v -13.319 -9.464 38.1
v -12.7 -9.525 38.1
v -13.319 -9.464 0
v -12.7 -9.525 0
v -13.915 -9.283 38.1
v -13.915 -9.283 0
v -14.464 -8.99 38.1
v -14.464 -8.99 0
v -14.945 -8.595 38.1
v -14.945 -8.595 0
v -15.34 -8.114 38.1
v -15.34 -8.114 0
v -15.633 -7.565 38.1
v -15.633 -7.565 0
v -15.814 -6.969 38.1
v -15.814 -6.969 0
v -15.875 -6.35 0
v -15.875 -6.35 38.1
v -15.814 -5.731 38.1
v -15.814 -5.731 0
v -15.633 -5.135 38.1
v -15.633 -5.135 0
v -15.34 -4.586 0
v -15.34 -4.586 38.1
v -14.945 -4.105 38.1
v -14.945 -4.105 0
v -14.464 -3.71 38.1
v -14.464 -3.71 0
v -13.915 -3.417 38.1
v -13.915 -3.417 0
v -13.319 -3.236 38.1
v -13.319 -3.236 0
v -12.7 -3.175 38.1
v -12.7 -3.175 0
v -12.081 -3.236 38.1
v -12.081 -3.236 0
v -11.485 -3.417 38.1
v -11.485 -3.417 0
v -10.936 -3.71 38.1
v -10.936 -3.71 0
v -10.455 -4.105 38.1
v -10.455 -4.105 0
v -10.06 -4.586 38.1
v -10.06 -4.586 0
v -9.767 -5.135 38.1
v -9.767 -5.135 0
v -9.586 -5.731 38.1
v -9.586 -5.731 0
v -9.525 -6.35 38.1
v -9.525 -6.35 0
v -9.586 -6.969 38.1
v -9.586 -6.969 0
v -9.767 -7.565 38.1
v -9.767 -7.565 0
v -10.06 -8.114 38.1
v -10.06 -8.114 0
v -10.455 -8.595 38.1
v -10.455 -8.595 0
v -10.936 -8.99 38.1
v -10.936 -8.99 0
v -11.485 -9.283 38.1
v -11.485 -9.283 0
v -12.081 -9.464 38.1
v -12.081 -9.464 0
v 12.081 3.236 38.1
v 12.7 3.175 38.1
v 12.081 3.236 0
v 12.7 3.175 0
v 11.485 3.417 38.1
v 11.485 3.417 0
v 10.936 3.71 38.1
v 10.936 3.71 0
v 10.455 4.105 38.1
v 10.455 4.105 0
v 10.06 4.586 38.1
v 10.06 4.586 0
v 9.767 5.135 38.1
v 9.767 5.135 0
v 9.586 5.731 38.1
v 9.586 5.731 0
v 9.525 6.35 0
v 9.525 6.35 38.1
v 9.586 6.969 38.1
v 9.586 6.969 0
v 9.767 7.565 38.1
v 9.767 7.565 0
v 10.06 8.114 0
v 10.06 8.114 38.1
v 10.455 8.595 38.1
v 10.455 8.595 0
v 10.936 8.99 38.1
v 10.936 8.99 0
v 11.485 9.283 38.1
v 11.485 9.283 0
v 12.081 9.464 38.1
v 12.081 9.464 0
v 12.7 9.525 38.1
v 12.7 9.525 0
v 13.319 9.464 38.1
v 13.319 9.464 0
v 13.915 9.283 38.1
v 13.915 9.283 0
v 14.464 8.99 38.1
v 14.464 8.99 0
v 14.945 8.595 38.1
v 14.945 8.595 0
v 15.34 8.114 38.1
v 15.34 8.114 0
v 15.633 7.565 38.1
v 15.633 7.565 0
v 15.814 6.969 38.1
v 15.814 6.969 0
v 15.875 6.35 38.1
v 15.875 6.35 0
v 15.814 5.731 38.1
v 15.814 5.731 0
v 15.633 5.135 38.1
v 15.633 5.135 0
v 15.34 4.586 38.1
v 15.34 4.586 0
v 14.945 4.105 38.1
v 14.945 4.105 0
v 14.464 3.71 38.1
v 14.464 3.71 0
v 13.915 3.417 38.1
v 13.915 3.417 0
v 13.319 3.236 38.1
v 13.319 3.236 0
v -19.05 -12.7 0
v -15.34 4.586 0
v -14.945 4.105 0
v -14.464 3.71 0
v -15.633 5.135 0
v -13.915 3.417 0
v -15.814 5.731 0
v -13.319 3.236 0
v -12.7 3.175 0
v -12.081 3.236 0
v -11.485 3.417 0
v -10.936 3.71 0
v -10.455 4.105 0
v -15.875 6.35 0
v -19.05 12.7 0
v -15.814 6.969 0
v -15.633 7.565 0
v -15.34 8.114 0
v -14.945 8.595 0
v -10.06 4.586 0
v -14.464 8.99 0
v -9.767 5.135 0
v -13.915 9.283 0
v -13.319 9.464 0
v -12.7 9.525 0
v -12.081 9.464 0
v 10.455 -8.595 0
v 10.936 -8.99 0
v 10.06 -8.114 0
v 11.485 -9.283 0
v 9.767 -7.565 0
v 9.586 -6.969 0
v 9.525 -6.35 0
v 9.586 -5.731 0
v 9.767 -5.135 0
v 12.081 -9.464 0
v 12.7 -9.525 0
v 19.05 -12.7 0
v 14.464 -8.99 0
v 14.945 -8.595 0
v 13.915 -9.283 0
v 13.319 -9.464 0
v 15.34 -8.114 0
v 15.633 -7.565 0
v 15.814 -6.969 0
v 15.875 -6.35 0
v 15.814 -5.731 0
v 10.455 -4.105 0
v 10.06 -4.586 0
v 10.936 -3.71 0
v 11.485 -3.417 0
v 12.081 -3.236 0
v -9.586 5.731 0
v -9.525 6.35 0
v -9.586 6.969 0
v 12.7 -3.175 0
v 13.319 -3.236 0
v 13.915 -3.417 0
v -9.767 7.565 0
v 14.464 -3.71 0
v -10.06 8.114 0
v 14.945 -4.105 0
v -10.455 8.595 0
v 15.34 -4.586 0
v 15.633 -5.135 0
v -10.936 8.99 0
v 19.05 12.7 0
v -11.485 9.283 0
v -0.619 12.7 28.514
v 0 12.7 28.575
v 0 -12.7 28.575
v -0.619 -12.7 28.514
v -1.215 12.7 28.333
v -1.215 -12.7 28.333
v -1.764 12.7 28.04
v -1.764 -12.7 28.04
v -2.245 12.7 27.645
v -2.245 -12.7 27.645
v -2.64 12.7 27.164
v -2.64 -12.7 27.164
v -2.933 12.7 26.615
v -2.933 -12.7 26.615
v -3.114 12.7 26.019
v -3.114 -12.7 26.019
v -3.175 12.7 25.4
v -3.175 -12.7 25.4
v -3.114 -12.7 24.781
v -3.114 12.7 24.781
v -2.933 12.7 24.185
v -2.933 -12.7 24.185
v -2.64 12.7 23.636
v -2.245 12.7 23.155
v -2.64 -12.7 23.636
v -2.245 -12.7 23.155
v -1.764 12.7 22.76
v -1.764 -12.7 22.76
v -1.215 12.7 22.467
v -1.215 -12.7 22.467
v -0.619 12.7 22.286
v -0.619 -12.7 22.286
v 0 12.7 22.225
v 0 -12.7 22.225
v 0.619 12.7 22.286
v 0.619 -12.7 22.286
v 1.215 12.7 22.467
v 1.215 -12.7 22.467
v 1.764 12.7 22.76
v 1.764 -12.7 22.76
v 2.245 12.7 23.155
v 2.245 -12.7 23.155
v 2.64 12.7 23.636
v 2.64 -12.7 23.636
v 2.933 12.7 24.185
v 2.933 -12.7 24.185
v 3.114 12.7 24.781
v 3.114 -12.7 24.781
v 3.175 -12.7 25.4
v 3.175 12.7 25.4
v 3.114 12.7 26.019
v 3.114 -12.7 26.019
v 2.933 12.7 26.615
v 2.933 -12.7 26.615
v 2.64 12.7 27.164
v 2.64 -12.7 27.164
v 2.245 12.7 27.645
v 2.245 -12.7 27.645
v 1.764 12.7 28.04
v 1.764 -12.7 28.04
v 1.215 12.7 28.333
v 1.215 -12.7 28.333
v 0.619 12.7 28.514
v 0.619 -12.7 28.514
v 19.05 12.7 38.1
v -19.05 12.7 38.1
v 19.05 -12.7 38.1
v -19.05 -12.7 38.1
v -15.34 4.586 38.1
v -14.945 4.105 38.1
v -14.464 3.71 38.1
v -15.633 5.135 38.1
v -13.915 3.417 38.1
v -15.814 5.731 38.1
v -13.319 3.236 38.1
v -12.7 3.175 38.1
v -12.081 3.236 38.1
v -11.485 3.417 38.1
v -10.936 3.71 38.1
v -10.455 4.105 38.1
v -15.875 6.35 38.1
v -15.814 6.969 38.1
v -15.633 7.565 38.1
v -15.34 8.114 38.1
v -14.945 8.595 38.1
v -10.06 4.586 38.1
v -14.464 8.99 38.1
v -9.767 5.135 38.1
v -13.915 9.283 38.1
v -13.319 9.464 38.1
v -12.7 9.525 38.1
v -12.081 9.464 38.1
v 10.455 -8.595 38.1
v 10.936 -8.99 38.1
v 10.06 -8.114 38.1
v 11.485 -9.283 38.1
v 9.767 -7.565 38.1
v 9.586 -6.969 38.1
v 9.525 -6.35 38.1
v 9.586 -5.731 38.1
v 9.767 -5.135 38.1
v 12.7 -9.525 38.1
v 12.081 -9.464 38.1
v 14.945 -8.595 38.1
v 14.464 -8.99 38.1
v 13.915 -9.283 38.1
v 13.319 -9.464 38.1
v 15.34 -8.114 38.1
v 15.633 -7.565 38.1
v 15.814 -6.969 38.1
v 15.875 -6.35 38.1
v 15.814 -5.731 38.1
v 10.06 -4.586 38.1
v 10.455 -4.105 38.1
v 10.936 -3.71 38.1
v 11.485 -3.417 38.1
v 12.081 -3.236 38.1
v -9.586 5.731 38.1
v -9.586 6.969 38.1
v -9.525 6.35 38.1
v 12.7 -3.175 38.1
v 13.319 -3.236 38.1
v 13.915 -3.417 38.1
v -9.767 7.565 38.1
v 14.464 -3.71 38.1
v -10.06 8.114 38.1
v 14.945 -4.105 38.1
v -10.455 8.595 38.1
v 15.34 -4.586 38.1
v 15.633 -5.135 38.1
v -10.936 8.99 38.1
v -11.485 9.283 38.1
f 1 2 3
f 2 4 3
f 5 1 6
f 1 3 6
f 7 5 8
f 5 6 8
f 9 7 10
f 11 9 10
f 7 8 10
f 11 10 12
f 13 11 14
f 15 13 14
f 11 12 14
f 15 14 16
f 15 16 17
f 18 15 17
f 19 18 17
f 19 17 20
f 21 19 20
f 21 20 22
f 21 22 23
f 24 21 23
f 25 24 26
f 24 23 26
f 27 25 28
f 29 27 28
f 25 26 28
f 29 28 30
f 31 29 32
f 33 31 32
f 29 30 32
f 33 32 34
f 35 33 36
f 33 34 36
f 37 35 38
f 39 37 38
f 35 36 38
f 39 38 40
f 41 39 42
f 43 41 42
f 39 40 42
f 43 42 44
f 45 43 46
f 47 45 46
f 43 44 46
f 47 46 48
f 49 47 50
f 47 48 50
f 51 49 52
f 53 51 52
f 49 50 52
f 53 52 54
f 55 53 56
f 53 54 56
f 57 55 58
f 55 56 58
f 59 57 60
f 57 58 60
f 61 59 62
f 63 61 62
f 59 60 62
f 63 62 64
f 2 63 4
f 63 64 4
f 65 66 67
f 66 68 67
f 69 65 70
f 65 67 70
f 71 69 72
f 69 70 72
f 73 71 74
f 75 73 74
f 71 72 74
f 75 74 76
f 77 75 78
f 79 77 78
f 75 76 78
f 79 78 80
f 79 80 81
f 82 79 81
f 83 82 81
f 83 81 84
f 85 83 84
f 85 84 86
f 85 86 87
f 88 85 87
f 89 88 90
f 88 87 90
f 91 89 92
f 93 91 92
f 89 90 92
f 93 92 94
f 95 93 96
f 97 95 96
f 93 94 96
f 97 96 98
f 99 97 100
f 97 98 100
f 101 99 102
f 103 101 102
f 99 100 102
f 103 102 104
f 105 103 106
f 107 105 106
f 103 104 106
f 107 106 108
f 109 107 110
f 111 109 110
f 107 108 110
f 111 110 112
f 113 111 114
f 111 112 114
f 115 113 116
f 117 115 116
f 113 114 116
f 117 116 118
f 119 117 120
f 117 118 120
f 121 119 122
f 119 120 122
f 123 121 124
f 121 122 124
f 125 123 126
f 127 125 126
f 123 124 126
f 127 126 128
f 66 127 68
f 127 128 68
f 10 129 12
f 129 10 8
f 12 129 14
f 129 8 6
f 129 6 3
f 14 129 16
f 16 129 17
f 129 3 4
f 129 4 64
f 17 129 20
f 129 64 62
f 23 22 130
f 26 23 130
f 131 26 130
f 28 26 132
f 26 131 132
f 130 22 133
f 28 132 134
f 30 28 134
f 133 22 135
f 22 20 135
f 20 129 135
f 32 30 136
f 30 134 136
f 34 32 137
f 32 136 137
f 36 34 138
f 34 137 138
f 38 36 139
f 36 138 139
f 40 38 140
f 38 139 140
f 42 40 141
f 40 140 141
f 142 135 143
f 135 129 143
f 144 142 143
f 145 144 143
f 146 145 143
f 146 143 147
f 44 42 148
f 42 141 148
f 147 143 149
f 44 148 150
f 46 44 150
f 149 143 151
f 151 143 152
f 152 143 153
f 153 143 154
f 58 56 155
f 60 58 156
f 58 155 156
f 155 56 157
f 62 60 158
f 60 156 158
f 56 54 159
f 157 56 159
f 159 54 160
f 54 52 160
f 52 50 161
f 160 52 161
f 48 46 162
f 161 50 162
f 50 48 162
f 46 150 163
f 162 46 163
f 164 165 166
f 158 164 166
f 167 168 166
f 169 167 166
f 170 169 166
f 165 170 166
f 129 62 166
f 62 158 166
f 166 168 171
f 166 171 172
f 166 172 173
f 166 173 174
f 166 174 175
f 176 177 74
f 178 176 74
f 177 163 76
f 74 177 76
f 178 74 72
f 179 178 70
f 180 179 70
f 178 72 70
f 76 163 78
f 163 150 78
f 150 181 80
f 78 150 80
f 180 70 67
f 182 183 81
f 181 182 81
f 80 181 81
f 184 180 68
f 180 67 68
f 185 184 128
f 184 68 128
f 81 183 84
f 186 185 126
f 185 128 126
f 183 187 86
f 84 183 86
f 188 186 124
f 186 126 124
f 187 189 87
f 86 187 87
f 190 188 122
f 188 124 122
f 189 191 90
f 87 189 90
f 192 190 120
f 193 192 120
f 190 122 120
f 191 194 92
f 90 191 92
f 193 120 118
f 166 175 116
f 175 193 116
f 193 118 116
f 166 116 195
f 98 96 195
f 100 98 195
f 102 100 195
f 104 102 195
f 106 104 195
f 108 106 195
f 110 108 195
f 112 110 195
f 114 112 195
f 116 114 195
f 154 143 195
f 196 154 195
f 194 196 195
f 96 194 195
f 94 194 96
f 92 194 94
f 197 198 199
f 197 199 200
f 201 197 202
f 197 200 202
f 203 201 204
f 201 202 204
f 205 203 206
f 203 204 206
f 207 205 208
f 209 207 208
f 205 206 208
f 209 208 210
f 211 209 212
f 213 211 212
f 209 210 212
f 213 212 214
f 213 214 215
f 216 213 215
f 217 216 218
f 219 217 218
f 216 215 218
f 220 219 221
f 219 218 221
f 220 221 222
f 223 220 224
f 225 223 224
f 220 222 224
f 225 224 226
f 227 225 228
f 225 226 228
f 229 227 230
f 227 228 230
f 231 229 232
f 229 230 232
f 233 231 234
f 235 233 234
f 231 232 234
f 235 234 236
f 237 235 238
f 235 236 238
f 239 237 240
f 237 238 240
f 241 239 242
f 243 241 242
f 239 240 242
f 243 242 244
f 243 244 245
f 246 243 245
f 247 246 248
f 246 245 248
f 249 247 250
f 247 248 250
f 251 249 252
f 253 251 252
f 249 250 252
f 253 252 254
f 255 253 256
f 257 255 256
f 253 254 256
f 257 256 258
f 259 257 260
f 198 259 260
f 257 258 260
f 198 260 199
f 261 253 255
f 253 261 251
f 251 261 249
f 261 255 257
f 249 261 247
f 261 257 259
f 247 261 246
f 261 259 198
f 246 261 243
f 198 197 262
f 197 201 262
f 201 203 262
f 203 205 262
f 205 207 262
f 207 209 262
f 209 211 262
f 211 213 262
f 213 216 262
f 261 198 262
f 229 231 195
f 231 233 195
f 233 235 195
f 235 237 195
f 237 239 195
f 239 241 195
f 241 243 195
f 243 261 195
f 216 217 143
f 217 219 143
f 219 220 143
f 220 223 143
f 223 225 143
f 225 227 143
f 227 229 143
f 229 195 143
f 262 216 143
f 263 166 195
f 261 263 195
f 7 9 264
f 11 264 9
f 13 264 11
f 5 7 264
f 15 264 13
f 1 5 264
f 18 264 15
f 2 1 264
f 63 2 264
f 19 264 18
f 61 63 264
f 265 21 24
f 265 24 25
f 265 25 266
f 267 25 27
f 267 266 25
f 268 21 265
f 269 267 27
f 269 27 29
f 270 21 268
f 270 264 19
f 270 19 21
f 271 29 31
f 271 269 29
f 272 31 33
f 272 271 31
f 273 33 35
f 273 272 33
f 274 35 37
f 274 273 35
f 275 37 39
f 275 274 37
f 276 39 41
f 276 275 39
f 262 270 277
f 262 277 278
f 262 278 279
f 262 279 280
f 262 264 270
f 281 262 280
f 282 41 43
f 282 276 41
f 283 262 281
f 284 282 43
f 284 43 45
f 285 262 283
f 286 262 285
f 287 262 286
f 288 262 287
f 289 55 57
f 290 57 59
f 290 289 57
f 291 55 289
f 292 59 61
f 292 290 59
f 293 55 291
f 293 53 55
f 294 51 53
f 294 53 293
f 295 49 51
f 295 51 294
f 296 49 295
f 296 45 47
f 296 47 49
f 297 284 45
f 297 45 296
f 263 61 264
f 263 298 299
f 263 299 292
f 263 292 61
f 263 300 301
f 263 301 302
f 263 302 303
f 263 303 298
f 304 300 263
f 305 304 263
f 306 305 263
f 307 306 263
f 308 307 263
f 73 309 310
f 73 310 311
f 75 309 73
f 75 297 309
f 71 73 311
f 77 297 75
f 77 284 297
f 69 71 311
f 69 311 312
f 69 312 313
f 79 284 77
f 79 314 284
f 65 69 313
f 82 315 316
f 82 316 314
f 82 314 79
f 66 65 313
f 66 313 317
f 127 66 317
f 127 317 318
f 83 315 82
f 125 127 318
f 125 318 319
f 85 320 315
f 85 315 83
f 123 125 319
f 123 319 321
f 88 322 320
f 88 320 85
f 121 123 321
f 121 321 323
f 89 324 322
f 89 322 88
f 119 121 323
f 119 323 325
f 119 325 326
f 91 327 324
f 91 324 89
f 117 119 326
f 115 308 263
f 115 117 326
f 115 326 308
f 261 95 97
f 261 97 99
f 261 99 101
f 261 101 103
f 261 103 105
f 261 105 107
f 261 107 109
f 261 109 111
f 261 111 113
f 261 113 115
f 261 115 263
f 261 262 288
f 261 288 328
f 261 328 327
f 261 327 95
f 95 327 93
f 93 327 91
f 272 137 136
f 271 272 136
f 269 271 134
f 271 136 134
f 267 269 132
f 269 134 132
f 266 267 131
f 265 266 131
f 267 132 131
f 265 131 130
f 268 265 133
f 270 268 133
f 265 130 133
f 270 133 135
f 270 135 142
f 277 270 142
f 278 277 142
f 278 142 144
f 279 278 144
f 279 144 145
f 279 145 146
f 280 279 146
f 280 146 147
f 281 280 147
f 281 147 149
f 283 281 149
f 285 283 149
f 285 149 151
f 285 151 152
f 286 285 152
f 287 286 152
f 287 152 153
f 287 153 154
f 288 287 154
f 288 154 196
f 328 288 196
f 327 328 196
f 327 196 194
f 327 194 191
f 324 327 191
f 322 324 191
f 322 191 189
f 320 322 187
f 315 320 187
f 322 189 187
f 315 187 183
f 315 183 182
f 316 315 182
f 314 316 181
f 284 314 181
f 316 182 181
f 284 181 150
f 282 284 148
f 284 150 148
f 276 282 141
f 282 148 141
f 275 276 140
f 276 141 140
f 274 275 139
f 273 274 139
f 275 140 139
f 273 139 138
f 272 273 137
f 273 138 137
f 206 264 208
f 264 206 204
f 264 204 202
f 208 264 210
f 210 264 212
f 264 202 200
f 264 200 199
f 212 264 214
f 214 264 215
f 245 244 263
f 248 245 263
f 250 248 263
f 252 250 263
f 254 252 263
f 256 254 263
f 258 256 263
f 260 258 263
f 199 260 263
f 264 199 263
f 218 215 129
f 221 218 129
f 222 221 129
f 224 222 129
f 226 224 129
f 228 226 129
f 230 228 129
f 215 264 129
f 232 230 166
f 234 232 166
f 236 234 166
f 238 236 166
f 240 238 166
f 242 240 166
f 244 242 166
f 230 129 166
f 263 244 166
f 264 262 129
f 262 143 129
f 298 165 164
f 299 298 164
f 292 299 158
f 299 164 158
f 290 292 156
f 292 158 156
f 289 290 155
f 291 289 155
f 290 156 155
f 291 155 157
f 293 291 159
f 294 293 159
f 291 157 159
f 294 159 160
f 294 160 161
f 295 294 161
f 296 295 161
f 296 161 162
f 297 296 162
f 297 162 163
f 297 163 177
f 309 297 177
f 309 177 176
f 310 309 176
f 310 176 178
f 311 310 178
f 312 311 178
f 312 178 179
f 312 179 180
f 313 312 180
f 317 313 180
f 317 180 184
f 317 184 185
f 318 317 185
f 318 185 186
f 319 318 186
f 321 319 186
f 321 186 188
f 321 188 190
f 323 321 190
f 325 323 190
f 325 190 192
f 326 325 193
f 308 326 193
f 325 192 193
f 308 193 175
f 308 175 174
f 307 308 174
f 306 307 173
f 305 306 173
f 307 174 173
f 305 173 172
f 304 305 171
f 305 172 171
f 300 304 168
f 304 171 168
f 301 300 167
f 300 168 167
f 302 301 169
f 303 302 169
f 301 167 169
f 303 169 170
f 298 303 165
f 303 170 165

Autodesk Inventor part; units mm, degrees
ref_plane "YZ Plane" through (0, 0, 0) normal (1, 0, 0) x (0, 1, 0)
ref_plane "XZ Plane" through (0, 0, 0) normal (0, 1, 0) x (-1, 0, 0)
ref_plane "XY Plane" through (0, 0, 0) normal (0, 0, 1) x (1, 0, 0)
sketch "Sketch1" plane through (0, 0, 0) normal (0, 0, 1) x (1, 0, 0)
  line L0 (-19.05, -12.7) -> (19.05, -12.7)
  line L1 (19.05, -12.7) -> (19.05, 12.7)
  line L2 (19.05, 12.7) -> (-19.05, 12.7)
  line L3 (-19.05, 12.7) -> (-19.05, -12.7)
  line L4 (-19.05, -12.7) -> (19.05, 12.7) construction
  line L5 (19.05, -12.7) -> (-19.05, 12.7) construction
  point P0 (0, 0)
  dimension "d0" = 38.1
  dimension "d1" = 25.4
extrude "Extrusion1" add sketch "Sketch1" along normal blind 38.1
sketch "Sketch2" plane through (0, 0, 38.1) normal (0, 0, 1) x (1, 0, 0)
  line L0 (12.7, -6.35) -> (-12.7, -6.35)
  line L1 (-12.7, -6.35) -> (-12.7, 6.35)
  line L2 (-12.7, 6.35) -> (12.7, 6.35)
  line L3 (12.7, 6.35) -> (12.7, -6.35)
  line L4 (12.7, -6.35) -> (-12.7, 6.35) construction
  line L5 (-12.7, -6.35) -> (12.7, 6.35) construction
  point P0 (0, 0)
  point P1 (0, 0)
  dimension "d4" = 25.4
  dimension "d5" = 12.7
hole "Hole1" at (12.7, 6.35, 38.1) at (-12.7, 6.35, 38.1) at (-12.7, -6.35, 38.1) at (12.7, -6.35, 38.1) direction (0, 0, -1) diameter 6.35 end through all
sketch "Sketch3" plane through (-19.05, 12.7, 0) normal (0, 1, 0) x (1, 0, 0)
  line L0 (38.1, 0) -> (38.1, -38.1) projected
  line L1 (19.05, 0) -> (19.05, -25.4) construction
  dimension "d13" = 25.4
hole "Hole2" at (0, 12.7, 25.4) direction (0, -1, 0) diameter 6.35 end through all
properties part number "rod guide"
